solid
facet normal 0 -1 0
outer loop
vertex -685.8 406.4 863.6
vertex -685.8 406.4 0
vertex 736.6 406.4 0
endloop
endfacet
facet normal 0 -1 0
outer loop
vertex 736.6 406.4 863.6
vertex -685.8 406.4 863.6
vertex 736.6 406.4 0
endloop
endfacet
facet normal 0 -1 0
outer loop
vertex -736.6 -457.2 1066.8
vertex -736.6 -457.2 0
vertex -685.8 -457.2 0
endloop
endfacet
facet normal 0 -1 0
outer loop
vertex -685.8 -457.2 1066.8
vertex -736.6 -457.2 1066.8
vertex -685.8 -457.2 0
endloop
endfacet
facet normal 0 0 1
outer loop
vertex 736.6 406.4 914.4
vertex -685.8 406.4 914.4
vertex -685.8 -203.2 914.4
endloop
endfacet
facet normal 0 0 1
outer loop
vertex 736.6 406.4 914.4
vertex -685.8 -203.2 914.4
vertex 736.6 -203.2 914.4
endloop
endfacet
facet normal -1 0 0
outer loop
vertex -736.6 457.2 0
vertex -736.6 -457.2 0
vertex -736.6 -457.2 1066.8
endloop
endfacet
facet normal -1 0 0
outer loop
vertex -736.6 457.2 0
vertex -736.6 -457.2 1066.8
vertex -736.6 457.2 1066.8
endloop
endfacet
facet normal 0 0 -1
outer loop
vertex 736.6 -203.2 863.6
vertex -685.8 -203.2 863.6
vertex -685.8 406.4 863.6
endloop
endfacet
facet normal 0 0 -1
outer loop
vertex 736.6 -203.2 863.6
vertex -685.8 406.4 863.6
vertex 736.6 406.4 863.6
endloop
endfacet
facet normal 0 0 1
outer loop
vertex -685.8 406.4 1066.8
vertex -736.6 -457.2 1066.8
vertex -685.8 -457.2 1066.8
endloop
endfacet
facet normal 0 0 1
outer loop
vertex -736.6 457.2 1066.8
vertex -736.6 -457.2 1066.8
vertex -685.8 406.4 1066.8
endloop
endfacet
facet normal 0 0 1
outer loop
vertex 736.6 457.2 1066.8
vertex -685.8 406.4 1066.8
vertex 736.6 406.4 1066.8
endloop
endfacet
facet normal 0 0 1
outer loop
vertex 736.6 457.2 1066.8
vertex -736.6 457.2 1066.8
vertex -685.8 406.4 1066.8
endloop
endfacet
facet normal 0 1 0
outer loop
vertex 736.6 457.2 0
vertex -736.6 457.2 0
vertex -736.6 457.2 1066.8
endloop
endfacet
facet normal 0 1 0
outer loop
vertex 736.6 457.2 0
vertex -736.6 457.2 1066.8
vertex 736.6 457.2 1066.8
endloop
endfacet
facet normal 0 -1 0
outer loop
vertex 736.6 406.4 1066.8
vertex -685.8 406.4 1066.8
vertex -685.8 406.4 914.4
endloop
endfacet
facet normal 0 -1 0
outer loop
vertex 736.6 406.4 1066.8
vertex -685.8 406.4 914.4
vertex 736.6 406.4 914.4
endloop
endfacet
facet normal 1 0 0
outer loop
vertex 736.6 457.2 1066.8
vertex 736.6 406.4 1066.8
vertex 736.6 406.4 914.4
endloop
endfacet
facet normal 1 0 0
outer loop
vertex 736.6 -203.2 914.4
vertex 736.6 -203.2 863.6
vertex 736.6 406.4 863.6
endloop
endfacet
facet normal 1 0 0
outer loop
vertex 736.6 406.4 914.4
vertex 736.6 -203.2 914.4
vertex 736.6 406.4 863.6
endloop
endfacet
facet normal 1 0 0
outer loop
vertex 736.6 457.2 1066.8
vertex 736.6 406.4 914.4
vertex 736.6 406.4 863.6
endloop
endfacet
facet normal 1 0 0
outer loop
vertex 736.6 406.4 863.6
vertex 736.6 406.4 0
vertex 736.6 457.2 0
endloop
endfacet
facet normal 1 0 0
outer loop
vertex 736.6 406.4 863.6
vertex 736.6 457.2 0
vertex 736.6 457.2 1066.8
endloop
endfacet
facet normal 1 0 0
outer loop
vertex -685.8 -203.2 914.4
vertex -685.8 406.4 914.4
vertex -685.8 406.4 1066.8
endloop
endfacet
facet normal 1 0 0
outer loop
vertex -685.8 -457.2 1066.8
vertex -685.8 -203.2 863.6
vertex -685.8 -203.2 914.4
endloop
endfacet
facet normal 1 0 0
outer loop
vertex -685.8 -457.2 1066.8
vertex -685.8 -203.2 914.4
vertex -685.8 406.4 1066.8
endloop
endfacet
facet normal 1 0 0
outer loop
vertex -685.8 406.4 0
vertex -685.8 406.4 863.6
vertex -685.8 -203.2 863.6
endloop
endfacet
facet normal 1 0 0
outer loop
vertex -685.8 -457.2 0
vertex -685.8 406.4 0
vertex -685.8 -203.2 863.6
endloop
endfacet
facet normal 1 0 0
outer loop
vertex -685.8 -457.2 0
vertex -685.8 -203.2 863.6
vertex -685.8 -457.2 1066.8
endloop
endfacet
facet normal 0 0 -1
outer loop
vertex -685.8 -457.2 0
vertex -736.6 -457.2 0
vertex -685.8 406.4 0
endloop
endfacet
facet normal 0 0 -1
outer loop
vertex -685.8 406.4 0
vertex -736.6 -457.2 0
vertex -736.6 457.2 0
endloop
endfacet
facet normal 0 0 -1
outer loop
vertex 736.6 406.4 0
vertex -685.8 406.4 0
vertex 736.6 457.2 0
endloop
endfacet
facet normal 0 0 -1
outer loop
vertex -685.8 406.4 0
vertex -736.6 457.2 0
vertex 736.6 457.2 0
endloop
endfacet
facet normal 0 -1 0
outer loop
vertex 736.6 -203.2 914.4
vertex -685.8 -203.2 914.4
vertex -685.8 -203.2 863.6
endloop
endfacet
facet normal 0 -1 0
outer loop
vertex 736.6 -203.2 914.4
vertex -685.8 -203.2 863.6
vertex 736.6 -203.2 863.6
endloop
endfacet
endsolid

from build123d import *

# Parameters (mm, degrees)
F0_W     = 1473.2
F0_H     = 914.4
F1_DEPTH = 1066.8
F2_W     = 1422.4
F2_H     = 863.6
F3_DEPTH = 152.4
F4_W     = 1422.4
F4_H     = 863.6
F5_DEPTH = 863.6
F6_W     = 1422.4
F6_H     = 254
F7_DEPTH = 914.401


with BuildPart() as f1:
    # F0 (on Top) → F1 (new body)
    with BuildSketch(Plane.XY):
        Rectangle(F0_W, F0_H)
    extrude(amount=F1_DEPTH)

    # F2 (on face) → F3 (cut)
    with BuildSketch(Plane.XY.offset(1066.8)):
        with Locations((25.4, -25.4)):
            Rectangle(F2_W, F2_H)
    extrude(amount=-F3_DEPTH, mode=Mode.SUBTRACT)

    # F4 (on face) → F5 (cut)
    with BuildSketch(Plane(origin=(0, 0, 0), x_dir=(1, 0, 0), z_dir=(0, 0, -1))):
        with Locations((25.4, 25.4)):
            Rectangle(F4_W, F4_H)
    extrude(amount=-F5_DEPTH, mode=Mode.SUBTRACT)

    # F6 (on face) → F7 (cut, through all)
    with BuildSketch(Plane.XY.offset(914.4)):
        with Locations((25.4, -330.2)):
            Rectangle(F6_W, F6_H)
    extrude(amount=-F7_DEPTH, mode=Mode.SUBTRACT)


solid = f1.part
